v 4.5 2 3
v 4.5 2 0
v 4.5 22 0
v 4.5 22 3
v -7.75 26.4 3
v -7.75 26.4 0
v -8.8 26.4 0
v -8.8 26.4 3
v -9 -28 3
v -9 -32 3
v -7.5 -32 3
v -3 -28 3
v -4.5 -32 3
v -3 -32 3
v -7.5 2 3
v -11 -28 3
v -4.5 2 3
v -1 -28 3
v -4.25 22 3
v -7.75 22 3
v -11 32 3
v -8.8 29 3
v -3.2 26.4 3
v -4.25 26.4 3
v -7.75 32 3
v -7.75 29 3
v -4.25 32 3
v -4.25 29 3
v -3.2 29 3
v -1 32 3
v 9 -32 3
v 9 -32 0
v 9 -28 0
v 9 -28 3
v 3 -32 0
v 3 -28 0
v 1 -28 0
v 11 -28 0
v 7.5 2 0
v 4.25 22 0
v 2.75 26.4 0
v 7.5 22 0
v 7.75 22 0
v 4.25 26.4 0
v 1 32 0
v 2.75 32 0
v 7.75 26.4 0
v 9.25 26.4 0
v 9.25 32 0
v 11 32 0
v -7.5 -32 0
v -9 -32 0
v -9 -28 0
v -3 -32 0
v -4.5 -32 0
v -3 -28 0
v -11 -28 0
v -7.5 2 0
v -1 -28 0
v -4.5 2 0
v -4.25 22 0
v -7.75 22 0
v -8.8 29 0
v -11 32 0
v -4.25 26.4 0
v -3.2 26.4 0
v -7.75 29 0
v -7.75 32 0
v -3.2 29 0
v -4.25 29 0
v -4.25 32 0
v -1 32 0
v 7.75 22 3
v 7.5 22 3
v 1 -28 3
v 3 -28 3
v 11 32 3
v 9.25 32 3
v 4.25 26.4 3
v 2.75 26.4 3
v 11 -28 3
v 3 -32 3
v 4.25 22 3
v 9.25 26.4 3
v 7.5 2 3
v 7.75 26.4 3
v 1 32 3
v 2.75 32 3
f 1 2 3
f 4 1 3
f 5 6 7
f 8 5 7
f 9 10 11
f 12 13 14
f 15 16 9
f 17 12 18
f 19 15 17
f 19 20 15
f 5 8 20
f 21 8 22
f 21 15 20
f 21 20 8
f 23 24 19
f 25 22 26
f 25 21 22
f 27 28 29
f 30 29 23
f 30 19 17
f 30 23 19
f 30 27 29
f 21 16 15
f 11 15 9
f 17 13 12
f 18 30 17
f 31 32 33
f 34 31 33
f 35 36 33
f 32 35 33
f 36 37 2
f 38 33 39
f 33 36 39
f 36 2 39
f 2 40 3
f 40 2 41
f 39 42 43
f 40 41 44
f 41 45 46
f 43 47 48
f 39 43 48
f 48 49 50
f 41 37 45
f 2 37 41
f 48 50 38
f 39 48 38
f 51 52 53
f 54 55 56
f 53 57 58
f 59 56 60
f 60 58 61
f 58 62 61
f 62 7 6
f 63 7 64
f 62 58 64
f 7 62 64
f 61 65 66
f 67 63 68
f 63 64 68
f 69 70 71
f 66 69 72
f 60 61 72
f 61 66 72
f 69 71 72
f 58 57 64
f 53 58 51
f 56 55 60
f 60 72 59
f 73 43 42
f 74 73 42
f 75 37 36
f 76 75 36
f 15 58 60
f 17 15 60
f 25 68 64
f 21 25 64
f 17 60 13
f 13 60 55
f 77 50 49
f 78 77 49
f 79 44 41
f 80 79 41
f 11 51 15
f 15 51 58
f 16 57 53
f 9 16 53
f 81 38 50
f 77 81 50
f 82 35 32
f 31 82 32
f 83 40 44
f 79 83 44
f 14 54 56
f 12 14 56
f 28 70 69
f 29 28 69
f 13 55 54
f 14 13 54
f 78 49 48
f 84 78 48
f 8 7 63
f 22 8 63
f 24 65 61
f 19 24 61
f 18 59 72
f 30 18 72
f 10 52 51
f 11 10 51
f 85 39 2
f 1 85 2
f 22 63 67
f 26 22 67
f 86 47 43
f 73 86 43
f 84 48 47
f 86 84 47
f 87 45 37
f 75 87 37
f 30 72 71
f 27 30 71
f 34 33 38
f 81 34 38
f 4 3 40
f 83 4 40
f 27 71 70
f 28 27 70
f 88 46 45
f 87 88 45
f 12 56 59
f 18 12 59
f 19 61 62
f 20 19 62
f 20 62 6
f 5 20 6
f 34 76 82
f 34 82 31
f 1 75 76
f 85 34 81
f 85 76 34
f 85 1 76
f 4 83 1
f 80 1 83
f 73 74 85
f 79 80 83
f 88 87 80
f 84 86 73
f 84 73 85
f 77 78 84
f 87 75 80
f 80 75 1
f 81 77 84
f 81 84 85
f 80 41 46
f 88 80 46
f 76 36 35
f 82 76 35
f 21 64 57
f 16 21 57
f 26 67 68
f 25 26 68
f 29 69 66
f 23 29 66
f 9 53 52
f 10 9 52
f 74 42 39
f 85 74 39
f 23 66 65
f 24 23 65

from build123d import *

# Parameters (mm, degrees)
F1_DEPTH = 3


with BuildPart() as f1:
    # F0 (on Top) → F1 (new body)
    with BuildSketch(Plane.XY):
        Polygon((-7.75, 32), (-11, 32), (-11, -28), (-9, -28), (-9, -32), (-7.5, -32), (-7.5, 2), (-4.5, 2), (-4.5, -32), (-3, -32), (-3, -28), (-1, -28), (-1, 32), (-4.25, 32), (-4.25, 29), (-3.2, 29), (-3.2, 26.4), (-4.25, 26.4), (-4.25, 22), (-7.75, 22), (-7.75, 26.4), (-8.8, 26.4), (-8.8, 29), (-7.75, 29), align=None)
        Polygon((2.75, 32), (1, 32), (1, -28), (3, -28), (3, -32), (9, -32), (9, -28), (11, -28), (11, 32), (9.25, 32), (9.25, 26.4), (7.75, 26.4), (7.75, 22), (7.5, 22), (7.5, 2), (4.5, 2), (4.5, 22), (4.25, 22), (4.25, 26.4), (2.75, 26.4), align=None)
    extrude(amount=F1_DEPTH)


solid = f1.part
